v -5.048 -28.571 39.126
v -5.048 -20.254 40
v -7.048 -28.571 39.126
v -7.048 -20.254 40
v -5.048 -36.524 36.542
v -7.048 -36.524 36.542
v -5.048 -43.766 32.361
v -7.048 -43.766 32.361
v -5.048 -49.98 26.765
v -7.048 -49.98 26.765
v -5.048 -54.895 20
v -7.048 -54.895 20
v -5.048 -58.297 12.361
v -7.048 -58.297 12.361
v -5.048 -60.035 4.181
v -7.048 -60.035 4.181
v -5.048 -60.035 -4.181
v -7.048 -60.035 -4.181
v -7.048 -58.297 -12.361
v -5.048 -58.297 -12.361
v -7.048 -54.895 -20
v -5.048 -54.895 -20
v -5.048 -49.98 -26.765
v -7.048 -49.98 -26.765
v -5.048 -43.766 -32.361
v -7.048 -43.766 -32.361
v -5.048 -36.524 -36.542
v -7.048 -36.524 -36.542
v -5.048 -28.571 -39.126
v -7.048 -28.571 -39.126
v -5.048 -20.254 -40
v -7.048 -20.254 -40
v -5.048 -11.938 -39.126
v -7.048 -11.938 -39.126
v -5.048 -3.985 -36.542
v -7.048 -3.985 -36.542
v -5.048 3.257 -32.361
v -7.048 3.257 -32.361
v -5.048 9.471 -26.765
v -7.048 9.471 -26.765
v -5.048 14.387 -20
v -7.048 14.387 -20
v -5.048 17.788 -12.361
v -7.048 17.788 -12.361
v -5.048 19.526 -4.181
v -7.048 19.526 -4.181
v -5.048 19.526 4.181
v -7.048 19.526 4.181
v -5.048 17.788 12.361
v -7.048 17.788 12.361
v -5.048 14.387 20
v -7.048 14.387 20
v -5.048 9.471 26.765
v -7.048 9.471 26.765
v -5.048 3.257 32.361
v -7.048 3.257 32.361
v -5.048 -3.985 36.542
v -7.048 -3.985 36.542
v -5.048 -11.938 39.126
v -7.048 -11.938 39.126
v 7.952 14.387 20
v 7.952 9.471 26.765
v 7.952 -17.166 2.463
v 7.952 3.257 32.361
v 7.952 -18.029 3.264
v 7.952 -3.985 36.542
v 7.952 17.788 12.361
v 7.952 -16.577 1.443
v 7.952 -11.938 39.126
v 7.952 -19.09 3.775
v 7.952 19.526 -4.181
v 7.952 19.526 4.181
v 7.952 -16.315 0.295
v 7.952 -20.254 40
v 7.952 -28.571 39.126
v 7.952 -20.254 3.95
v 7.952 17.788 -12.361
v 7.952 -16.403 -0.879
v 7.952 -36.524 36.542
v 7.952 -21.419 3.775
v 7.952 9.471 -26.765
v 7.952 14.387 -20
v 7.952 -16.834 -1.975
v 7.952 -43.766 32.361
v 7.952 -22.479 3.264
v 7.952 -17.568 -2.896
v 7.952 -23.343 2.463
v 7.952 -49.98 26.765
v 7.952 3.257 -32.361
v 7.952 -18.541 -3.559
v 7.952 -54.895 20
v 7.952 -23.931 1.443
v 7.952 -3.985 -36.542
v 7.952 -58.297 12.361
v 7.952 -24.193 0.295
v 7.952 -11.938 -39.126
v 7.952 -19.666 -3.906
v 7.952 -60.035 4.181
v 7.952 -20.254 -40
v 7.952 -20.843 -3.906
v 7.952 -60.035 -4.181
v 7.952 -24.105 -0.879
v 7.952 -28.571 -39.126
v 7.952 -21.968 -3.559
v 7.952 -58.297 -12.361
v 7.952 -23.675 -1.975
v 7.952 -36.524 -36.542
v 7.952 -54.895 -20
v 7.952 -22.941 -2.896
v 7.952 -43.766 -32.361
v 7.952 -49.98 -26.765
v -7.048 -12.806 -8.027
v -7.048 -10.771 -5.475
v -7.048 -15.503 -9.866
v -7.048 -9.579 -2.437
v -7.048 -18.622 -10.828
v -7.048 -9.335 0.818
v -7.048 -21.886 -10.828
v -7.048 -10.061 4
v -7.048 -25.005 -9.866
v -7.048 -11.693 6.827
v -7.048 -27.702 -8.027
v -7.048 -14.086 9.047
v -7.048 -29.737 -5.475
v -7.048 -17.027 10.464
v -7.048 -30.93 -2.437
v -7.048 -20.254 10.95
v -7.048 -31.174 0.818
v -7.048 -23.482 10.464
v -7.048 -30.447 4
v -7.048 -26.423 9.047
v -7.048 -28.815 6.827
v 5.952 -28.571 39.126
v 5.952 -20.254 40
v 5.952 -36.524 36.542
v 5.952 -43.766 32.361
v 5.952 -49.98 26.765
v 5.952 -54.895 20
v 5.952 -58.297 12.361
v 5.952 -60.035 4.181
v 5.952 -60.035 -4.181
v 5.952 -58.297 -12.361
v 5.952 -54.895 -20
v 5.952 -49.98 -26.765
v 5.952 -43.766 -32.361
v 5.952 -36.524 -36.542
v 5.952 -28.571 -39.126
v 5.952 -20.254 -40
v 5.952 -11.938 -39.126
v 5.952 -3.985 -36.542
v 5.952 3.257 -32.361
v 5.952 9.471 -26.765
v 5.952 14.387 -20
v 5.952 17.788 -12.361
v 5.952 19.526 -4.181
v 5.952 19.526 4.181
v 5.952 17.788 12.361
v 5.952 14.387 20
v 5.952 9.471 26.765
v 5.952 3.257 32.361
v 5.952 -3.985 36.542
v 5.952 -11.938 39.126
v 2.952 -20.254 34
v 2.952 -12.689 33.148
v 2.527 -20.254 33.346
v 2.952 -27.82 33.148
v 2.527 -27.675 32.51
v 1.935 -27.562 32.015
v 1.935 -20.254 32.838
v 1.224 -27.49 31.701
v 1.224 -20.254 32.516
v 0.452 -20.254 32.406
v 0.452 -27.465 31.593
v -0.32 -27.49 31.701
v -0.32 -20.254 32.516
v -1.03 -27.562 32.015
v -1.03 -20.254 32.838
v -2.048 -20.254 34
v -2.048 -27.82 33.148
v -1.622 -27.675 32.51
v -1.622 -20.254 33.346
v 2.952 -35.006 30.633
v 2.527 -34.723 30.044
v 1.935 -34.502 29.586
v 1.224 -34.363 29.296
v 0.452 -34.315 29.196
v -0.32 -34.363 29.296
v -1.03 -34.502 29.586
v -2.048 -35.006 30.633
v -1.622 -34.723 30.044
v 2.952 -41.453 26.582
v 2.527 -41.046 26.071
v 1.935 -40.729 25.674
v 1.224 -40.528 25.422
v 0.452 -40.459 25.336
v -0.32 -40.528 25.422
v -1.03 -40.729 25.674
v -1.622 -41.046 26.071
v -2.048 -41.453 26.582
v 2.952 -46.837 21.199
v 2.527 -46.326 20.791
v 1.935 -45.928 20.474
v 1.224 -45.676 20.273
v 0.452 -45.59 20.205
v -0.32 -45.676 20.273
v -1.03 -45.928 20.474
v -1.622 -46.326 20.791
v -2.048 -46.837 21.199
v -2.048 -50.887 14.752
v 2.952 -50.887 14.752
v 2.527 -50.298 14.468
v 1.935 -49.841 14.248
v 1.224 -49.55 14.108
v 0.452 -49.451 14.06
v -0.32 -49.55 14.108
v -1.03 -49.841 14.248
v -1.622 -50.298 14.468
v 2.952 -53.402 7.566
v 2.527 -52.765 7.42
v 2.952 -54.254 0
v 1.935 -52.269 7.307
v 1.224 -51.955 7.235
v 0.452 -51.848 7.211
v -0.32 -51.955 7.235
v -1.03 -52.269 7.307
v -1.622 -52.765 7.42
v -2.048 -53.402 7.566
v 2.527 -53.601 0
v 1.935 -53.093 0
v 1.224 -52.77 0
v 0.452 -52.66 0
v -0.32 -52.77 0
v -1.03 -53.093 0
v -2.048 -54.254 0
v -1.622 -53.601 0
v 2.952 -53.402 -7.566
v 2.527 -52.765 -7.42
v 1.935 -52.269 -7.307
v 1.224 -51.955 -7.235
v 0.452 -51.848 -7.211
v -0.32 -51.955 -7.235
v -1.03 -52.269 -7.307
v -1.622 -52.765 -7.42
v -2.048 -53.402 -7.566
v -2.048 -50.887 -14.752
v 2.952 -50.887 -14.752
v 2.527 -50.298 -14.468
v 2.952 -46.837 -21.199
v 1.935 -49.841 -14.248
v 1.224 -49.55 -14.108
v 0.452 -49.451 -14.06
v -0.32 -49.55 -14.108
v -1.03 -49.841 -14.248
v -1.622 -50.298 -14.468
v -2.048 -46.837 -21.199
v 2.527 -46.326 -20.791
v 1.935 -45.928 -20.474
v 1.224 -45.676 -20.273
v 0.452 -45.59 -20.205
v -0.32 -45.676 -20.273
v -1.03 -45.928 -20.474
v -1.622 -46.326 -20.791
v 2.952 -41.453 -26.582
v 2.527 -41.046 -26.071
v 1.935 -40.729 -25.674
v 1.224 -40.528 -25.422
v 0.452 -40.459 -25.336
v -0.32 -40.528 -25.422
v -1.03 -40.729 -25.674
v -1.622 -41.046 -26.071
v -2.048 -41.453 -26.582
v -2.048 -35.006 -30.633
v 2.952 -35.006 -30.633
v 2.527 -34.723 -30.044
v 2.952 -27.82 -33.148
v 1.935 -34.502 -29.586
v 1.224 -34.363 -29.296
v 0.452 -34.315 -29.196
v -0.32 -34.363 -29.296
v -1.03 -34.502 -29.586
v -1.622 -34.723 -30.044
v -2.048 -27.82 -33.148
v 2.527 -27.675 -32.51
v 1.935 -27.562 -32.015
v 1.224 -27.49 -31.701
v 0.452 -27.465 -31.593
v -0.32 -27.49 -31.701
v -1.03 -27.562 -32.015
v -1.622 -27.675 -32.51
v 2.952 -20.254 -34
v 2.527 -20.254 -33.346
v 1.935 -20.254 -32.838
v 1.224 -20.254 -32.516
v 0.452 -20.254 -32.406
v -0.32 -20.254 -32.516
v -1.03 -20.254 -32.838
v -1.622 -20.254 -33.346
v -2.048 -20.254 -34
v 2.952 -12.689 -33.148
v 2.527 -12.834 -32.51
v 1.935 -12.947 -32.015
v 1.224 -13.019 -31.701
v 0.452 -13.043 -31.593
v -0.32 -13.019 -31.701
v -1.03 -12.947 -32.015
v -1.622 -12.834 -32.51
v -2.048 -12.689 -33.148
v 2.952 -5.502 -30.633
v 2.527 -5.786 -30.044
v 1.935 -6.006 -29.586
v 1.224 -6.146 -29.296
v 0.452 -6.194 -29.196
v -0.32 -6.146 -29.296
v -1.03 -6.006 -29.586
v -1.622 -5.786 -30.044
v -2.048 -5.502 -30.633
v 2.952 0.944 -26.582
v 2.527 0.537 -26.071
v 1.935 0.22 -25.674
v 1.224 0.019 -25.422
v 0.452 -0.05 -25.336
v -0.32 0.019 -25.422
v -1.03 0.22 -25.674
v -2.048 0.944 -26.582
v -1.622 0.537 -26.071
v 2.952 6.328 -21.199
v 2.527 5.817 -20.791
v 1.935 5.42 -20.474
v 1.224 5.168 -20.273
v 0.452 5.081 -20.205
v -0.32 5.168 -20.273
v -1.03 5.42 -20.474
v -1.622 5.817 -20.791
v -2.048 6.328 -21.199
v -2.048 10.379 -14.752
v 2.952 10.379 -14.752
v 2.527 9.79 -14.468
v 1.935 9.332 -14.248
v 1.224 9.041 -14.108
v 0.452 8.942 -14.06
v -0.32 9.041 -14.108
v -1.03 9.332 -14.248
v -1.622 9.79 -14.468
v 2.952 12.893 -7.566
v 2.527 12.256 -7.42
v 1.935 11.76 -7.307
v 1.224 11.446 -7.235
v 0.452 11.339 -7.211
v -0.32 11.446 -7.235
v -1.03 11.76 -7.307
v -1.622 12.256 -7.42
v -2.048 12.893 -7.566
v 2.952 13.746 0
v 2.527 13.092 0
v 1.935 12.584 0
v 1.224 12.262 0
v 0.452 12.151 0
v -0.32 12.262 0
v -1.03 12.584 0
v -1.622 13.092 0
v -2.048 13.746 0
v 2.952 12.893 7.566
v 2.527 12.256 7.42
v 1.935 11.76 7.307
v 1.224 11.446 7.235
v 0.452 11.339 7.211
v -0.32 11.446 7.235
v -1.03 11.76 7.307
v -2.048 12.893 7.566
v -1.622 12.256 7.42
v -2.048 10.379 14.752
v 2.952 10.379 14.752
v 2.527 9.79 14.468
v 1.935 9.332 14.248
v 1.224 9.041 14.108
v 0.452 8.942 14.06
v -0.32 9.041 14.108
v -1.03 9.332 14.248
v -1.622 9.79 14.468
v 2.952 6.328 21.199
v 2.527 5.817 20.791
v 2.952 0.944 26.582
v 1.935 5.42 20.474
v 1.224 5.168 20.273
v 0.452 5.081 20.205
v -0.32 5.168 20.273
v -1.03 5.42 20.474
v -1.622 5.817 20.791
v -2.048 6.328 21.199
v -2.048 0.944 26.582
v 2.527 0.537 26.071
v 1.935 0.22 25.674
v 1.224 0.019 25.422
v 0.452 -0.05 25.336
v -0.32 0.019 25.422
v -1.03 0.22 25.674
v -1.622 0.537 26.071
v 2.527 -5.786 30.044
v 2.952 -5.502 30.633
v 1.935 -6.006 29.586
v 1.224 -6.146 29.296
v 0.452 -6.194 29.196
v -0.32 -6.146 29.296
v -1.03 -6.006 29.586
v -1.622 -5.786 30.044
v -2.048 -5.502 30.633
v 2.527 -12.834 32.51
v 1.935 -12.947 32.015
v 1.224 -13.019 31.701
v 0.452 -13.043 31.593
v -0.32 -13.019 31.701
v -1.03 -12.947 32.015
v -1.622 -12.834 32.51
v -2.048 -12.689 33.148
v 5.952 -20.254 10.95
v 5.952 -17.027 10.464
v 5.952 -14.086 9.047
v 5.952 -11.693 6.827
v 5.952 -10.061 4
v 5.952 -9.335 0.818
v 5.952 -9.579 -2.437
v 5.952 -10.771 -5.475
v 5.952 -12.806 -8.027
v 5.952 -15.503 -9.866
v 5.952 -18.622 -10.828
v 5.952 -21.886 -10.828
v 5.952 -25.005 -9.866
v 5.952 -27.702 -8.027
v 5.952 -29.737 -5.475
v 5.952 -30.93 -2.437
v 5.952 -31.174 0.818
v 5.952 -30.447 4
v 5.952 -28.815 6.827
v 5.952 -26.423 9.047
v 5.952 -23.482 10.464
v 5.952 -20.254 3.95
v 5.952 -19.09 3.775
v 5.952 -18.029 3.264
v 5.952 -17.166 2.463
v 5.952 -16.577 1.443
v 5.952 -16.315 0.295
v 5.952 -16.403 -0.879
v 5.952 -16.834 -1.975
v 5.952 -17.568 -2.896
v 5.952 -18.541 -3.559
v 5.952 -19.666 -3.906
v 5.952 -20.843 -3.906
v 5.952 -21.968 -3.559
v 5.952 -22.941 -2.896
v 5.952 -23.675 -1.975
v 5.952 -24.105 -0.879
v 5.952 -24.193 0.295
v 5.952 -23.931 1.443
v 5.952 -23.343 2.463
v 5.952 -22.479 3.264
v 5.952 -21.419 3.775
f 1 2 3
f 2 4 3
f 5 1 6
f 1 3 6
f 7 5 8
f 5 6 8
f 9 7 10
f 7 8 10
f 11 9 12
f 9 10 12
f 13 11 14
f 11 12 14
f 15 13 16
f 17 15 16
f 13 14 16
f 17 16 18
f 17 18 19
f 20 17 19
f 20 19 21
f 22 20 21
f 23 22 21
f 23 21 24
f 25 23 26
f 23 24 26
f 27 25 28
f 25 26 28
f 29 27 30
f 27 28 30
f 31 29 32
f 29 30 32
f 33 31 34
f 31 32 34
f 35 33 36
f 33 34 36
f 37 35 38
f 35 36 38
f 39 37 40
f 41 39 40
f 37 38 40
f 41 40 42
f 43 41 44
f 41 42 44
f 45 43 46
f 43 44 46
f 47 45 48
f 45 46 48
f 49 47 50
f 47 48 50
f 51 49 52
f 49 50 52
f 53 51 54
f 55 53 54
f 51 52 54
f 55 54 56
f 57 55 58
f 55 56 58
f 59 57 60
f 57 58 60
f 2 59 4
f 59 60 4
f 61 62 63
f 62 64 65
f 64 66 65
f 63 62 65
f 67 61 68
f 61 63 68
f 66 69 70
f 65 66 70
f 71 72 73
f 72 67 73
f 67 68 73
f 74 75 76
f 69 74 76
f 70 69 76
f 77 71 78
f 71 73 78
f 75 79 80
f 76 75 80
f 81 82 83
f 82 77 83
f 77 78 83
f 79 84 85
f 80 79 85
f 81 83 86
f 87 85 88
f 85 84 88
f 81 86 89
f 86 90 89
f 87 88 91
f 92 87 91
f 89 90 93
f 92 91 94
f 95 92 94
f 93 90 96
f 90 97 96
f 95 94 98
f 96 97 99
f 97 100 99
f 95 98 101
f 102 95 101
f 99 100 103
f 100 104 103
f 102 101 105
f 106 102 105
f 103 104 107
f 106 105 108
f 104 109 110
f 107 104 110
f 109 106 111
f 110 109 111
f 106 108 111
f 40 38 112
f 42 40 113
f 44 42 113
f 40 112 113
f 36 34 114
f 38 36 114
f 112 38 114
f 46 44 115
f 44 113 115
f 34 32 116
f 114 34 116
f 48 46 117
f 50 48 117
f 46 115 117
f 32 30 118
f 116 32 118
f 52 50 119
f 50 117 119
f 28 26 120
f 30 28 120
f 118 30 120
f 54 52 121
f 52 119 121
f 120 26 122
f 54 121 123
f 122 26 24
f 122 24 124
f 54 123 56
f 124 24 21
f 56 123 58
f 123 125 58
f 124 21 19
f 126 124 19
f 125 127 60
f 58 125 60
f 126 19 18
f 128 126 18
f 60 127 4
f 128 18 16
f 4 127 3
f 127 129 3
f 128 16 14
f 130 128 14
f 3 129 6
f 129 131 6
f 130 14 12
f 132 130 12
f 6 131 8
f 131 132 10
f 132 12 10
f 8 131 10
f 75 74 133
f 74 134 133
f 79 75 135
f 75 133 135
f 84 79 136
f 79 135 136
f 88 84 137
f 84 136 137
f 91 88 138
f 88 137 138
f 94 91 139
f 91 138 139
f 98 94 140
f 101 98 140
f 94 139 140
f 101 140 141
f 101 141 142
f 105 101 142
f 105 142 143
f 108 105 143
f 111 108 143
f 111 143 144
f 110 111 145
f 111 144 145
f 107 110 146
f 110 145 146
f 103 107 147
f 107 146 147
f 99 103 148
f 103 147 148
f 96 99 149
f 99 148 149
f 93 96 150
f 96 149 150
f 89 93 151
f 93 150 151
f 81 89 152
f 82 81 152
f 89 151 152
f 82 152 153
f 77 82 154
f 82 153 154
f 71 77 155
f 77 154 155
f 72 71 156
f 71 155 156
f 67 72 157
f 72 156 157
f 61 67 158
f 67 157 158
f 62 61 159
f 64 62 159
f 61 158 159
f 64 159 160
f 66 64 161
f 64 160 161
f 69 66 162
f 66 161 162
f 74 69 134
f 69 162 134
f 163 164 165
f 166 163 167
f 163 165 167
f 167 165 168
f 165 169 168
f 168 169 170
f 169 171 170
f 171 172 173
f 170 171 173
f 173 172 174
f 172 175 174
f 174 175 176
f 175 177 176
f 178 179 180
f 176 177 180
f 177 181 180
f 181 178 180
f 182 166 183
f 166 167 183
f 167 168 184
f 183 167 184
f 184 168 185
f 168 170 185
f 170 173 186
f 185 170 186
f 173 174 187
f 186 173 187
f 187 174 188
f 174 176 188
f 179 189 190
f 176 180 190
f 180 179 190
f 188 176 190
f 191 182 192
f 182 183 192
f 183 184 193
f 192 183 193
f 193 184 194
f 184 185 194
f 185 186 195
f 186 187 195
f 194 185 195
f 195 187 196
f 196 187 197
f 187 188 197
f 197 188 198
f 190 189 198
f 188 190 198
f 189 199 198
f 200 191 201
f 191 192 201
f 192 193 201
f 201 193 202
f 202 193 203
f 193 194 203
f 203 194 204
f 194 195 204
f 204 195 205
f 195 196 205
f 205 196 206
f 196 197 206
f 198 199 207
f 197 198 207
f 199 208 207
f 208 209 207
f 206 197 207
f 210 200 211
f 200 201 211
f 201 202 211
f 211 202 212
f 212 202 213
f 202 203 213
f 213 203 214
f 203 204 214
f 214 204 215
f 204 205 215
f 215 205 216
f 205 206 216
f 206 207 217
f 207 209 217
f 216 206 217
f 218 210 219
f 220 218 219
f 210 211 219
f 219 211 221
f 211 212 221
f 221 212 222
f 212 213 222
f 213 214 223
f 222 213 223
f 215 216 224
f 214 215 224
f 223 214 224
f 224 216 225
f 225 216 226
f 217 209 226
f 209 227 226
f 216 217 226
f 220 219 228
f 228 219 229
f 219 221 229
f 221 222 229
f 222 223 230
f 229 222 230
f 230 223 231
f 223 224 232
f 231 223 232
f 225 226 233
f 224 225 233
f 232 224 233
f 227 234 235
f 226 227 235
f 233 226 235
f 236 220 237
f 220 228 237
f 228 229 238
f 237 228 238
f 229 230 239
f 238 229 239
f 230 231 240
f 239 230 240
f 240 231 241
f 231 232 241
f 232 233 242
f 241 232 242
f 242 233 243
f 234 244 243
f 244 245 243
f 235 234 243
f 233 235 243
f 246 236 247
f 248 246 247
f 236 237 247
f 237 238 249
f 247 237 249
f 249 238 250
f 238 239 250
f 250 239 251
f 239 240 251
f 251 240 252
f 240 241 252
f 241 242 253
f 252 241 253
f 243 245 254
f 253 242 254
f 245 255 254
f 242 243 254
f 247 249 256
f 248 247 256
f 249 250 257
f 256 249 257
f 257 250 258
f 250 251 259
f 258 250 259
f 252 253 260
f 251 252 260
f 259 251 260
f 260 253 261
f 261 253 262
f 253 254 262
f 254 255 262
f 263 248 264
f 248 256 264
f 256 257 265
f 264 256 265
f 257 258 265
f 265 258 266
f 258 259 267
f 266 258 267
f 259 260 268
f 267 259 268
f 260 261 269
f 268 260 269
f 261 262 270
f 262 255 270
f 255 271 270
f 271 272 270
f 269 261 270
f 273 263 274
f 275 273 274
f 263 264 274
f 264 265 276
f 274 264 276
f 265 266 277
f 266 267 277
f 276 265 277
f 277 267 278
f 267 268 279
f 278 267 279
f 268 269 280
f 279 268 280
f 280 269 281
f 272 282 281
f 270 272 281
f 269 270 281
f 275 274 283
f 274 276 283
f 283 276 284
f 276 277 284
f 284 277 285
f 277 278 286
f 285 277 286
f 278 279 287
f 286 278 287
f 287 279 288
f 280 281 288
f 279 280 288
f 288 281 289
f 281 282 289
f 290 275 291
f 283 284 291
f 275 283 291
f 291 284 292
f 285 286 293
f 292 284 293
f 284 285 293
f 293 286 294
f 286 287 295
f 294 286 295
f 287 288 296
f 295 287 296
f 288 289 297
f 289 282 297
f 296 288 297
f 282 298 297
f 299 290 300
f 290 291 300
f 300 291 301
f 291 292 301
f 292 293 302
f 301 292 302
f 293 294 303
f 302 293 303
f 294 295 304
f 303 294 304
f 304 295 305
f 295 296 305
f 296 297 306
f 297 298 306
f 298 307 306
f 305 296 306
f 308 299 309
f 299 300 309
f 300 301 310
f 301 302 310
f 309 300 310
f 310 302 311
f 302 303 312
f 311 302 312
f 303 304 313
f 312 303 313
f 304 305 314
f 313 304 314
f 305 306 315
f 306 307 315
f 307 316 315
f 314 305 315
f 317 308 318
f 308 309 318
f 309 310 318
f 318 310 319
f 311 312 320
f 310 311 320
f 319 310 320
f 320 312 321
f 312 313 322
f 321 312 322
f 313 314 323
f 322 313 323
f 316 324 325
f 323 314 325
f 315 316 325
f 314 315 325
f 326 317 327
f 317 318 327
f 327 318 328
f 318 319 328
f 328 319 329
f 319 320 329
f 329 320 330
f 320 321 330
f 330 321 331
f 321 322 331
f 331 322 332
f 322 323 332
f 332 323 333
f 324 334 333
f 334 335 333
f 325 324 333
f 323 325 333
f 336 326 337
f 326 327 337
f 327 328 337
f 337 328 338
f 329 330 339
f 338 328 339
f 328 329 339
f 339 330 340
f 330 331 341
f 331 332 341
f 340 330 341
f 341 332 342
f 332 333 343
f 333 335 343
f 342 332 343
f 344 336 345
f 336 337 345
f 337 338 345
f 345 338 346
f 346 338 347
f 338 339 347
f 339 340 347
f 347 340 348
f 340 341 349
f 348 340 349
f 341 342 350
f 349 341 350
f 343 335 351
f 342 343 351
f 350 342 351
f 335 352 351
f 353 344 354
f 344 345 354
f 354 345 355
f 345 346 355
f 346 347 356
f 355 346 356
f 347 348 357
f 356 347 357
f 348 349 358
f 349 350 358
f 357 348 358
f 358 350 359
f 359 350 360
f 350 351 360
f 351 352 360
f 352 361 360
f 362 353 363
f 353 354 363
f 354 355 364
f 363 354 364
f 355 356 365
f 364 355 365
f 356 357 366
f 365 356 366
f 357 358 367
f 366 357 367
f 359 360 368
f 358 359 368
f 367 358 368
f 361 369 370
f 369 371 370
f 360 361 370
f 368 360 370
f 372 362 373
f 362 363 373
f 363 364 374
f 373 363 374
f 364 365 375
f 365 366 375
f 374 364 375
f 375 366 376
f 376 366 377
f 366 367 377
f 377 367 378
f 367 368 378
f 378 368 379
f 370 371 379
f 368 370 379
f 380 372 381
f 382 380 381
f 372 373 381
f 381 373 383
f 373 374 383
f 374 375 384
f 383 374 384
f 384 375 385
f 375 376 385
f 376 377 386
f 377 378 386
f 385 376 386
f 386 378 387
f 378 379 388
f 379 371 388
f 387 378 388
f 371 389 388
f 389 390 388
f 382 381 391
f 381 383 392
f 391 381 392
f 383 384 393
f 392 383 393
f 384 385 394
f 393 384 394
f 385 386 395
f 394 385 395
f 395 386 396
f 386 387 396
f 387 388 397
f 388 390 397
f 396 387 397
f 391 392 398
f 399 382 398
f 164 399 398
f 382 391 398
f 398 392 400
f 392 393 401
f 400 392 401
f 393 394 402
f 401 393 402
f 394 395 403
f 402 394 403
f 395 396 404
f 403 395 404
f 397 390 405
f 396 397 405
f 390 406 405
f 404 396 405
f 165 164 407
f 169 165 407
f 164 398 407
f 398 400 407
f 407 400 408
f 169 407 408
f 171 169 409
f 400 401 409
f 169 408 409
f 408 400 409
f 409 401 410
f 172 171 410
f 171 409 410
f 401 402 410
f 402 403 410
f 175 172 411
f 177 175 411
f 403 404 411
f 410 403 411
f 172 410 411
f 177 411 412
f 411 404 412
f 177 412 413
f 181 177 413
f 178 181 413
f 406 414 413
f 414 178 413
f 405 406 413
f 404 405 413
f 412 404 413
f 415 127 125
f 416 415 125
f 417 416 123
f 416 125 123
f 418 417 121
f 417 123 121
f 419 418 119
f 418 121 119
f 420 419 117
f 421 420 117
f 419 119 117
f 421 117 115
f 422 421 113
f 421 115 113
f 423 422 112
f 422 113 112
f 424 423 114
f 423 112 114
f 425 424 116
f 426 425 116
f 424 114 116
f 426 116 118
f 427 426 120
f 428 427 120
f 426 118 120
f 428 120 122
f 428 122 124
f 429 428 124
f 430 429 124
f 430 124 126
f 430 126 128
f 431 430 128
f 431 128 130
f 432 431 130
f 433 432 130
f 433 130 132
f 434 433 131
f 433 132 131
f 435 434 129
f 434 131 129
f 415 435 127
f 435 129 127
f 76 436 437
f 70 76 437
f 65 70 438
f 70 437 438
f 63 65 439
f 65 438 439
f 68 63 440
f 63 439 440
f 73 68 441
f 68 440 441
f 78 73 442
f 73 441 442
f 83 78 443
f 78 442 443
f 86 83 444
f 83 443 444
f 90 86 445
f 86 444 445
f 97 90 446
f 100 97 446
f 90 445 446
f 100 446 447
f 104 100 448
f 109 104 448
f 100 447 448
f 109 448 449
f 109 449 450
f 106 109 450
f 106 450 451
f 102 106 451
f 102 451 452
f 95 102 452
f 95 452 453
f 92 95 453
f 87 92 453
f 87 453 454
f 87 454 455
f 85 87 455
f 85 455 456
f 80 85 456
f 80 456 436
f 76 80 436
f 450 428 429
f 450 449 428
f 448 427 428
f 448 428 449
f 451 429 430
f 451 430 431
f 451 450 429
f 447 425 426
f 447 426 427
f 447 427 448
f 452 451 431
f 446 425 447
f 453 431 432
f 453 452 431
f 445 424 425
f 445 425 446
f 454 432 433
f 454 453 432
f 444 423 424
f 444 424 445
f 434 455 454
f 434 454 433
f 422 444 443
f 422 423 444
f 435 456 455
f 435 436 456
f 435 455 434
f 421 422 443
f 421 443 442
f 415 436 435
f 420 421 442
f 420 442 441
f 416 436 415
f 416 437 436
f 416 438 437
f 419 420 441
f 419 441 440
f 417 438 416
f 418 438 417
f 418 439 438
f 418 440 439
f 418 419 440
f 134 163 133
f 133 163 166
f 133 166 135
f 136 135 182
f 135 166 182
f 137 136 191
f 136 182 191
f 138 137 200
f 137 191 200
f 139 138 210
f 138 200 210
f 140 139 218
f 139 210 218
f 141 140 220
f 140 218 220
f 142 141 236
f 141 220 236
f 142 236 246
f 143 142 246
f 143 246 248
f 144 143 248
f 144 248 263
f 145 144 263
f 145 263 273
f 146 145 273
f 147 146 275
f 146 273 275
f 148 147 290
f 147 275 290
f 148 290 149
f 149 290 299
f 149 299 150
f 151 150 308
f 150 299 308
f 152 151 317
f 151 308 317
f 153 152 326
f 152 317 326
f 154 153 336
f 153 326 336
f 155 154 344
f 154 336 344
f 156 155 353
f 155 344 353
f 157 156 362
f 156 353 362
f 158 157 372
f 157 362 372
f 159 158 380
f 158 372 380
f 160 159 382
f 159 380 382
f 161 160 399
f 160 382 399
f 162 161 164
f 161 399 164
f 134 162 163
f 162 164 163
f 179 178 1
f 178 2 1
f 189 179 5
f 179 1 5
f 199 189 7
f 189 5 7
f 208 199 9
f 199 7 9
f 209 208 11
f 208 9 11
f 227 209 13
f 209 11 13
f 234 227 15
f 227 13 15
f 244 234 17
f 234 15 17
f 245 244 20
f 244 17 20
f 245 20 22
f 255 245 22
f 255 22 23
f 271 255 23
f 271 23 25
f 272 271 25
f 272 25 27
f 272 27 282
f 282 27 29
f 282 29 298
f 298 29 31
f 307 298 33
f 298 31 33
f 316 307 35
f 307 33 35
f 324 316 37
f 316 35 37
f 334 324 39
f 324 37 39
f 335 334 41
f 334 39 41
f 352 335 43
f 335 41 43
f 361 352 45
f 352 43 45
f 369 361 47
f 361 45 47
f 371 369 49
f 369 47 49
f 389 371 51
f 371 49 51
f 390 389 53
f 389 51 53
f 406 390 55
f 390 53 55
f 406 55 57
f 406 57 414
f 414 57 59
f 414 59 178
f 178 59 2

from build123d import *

# Parameters (mm, degrees)
CROQUIS2_R            = 3.95
CORTAR_EXTRUIR1_DEPTH = 62
CROQUIS3_R            = 10.95
CORTAR_EXTRUIR2_DEPTH = 13


with BuildPart() as part:
    # Croquis1 → Revolución1 (revolve)
    with BuildSketch(Plane.XY, mode=Mode.PRIVATE) as revoluci_n1_sk:
        with BuildLine():
            Line((5.952239129, 19.74561549), (2.952239129, 13.74561549))
            ThreePointArc((2.952239129, 13.74561549), (0.452239129, 12.151246549), (-2.047760871, 13.74561549))
            Line((-2.047760871, 13.74561549), (-5.047760871, 19.74561549))
            Line((-5.047760871, 19.74561549), (-7.047760871, 19.74561549))
            Line((-7.047760871, 19.74561549), (-7.047760871, -20.25438451))
            Line((-7.047760871, -20.25438451), (7.952239129, -20.25438451))
            Line((7.952239129, -20.25438451), (7.952239129, 19.74561549))
            Line((7.952239129, 19.74561549), (5.952239129, 19.74561549))
        make_face()
    revolve(revoluci_n1_sk.sketch.rotate(Axis((-20.844407183, -20.25438451, 0), (1, 0, 0)), 90), axis=Axis((-20.844407183, -20.25438451, 0), (1, 0, 0)))

    # Croquis2 → Cortar-Extruir1 (cut)
    with BuildSketch(Plane.ZY.offset(7.047760871)):
        with Locations((0, -20.25438451)):
            Circle(CROQUIS2_R)
    extrude(amount=-CORTAR_EXTRUIR1_DEPTH, mode=Mode.SUBTRACT)

    # Croquis3 → Cortar-Extruir2 (cut)
    with BuildSketch(Plane.ZY.offset(7.047760871)):
        with Locations((0, -20.25438451)):
            Circle(CROQUIS3_R)
    extrude(amount=-CORTAR_EXTRUIR2_DEPTH, mode=Mode.SUBTRACT)


solid = part.part
